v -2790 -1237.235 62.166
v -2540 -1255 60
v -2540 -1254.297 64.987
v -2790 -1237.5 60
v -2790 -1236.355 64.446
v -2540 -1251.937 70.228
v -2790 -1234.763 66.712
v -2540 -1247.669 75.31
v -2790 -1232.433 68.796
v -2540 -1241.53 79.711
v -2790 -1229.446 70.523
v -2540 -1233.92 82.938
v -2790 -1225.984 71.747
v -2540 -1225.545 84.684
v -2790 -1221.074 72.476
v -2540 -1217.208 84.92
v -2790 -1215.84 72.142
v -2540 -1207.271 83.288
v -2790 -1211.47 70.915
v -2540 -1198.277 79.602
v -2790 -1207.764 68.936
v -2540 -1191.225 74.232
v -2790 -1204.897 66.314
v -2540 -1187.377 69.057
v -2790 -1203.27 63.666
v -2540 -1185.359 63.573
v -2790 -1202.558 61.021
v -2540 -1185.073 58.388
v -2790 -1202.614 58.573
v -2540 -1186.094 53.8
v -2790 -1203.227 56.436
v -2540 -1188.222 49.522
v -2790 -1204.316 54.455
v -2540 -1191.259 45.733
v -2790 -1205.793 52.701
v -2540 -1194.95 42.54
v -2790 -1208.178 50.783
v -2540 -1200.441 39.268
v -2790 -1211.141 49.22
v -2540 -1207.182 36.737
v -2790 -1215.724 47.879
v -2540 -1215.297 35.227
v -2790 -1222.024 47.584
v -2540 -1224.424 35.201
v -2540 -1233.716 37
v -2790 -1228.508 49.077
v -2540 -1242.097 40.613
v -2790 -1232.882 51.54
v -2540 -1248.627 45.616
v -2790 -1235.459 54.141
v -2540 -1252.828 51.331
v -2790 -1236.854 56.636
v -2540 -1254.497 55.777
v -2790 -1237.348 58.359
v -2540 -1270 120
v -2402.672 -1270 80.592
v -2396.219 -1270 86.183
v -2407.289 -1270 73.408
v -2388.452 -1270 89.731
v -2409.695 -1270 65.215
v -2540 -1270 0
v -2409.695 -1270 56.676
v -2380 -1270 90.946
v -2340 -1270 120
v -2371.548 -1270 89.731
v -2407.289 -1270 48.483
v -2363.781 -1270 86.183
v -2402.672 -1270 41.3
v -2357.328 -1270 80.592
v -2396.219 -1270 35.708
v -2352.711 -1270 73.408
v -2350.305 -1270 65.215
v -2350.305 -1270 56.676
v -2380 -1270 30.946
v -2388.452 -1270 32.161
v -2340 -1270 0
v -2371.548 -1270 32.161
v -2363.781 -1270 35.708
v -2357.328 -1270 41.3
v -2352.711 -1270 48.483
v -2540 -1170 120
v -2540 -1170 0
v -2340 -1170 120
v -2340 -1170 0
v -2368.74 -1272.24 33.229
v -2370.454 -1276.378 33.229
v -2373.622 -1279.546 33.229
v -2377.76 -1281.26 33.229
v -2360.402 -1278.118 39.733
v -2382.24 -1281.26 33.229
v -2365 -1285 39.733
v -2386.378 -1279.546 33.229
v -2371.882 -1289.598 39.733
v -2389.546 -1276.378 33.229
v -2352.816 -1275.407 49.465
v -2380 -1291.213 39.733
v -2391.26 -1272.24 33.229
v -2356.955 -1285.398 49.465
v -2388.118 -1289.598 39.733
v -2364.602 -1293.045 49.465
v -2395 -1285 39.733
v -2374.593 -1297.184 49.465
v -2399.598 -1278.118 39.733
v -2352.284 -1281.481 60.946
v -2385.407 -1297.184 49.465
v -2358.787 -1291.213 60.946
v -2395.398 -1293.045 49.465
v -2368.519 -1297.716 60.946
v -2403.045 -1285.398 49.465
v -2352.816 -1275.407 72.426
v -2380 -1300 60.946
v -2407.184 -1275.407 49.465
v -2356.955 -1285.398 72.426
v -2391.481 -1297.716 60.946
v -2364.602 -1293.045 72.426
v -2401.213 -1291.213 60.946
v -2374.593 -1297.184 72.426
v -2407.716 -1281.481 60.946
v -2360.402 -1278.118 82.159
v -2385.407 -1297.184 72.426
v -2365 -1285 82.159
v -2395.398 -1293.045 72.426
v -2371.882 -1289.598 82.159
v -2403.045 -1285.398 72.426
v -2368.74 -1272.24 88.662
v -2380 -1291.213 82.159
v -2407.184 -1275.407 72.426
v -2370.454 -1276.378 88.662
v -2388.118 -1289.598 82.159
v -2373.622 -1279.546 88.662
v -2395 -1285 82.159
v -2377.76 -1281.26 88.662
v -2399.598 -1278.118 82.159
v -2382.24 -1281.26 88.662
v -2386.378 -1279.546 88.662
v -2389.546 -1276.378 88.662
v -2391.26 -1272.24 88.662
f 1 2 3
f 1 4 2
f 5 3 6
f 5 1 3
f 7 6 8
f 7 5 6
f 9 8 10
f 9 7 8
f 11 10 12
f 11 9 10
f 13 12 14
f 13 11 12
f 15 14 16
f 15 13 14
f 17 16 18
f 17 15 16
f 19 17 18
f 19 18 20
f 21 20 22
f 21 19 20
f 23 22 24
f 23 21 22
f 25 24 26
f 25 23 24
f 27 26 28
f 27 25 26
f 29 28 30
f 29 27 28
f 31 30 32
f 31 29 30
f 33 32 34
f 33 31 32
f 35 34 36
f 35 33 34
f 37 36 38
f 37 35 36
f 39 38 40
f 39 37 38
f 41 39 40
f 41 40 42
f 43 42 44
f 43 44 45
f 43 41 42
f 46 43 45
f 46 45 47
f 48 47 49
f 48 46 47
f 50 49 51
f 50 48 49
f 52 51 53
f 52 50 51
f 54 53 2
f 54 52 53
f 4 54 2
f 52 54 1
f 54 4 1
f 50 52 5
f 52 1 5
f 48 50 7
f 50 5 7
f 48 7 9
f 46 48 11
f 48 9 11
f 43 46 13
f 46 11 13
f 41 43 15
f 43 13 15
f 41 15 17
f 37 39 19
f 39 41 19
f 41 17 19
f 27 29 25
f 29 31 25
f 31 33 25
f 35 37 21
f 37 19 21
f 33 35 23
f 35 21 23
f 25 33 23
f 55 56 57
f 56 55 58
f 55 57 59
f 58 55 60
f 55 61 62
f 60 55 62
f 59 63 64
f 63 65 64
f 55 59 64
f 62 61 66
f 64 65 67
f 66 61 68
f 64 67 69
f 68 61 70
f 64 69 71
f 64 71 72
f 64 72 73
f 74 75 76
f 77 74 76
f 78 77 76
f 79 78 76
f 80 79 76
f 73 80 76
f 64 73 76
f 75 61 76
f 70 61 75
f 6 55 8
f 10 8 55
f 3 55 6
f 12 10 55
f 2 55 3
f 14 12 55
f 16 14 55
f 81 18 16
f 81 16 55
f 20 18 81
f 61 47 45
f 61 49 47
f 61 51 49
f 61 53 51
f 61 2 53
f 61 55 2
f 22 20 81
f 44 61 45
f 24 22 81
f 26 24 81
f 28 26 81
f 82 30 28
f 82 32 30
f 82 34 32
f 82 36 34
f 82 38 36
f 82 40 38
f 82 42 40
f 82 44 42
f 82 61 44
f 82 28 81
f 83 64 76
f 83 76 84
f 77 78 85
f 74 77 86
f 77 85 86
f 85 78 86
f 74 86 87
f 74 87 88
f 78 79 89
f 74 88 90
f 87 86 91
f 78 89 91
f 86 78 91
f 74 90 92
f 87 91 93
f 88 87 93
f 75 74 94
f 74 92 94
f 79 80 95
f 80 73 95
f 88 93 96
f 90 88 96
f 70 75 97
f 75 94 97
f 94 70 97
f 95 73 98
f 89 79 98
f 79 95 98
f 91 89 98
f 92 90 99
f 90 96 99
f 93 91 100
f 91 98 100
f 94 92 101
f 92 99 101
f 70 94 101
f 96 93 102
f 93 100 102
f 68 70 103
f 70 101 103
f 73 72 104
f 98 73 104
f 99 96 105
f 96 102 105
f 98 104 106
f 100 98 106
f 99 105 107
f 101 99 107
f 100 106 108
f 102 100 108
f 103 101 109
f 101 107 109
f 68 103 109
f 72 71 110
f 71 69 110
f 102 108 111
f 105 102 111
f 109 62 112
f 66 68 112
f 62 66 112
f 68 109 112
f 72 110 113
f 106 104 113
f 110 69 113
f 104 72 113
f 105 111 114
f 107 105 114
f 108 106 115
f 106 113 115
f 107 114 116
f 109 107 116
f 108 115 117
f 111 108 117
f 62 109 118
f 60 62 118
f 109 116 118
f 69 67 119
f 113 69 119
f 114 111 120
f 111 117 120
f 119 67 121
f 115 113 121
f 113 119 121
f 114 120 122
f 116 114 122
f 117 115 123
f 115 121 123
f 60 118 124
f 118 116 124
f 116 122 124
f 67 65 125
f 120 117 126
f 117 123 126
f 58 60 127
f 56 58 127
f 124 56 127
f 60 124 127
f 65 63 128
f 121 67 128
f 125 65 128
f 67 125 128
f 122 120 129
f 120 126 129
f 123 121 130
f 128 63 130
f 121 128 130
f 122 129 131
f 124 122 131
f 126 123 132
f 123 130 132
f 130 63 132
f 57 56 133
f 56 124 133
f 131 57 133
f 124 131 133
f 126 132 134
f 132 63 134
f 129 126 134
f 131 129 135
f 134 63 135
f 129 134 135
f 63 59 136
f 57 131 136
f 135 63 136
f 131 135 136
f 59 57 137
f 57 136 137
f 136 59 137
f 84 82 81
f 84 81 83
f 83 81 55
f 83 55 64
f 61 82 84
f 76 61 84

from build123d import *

# Parameters (mm, degrees)
F0_W     = 200
F0_H     = 100
F1_DEPTH = 120


with BuildPart() as f1:
    # F0 (on Top) → F1 (new body)
    with BuildSketch(Plane.XY):
        with Locations((-2440, -1220)):
            Rectangle(F0_W, F0_H)
    extrude(amount=F1_DEPTH)

    # F2 (on face) → F3 (revolve)
    with BuildSketch(Plane.XZ.offset(1270)):
        with BuildLine():
            Line((-2380, 90.9458833933), (-2380, 30.9458833933))
            ThreePointArc((-2380, 30.9458833933), (-2350, 60.9458833933), (-2380, 90.9458833933))
        make_face()
    revolve(axis=Axis((-2380, -1270, 60.9458833933), (0, 0, -1)))

    # F5 (on face) → F8 section 0
    with BuildSketch(Plane(origin=(-2540, 0, 0), x_dir=(0, -1, 0), z_dir=(-1, 0, 0))):
        with BuildLine():
            add(Edge.make_bspline(
                [(1255, 60), (1255, 103.3012701892), (1202.5, 81.6506350946), (1150, 60), (1202.5, 38.3493649054), (1255, 16.6987298108), (1255, 60)],
                knots=[0, 0, 0, 2.0943951024, 2.0943951024, 4.1887902048, 4.1887902048, 6.2831853072, 6.2831853072, 6.2831853072], degree=2, weights=[1, 0.5, 1, 0.5, 1, 0.5, 1]))
        make_face()
    # F7 (on offset) → F8 section 1
    with BuildSketch(Plane(origin=(-2790, 0, 0), x_dir=(0, -1, 0), z_dir=(-1, 0, 0))):
        with BuildLine():
            add(Edge.make_bspline(
                [(1237.5, 60), (1237.5, 81.6506350946), (1211.25, 70.8253175473), (1185, 60), (1211.25, 49.1746824527), (1237.5, 38.3493649054), (1237.5, 60)],
                knots=[0, 0, 0, 2.0943951024, 2.0943951024, 4.1887902048, 4.1887902048, 6.2831853072, 6.2831853072, 6.2831853072], degree=2, weights=[1, 0.5, 1, 0.5, 1, 0.5, 1]))
        make_face()
    loft()


solid = f1.part
